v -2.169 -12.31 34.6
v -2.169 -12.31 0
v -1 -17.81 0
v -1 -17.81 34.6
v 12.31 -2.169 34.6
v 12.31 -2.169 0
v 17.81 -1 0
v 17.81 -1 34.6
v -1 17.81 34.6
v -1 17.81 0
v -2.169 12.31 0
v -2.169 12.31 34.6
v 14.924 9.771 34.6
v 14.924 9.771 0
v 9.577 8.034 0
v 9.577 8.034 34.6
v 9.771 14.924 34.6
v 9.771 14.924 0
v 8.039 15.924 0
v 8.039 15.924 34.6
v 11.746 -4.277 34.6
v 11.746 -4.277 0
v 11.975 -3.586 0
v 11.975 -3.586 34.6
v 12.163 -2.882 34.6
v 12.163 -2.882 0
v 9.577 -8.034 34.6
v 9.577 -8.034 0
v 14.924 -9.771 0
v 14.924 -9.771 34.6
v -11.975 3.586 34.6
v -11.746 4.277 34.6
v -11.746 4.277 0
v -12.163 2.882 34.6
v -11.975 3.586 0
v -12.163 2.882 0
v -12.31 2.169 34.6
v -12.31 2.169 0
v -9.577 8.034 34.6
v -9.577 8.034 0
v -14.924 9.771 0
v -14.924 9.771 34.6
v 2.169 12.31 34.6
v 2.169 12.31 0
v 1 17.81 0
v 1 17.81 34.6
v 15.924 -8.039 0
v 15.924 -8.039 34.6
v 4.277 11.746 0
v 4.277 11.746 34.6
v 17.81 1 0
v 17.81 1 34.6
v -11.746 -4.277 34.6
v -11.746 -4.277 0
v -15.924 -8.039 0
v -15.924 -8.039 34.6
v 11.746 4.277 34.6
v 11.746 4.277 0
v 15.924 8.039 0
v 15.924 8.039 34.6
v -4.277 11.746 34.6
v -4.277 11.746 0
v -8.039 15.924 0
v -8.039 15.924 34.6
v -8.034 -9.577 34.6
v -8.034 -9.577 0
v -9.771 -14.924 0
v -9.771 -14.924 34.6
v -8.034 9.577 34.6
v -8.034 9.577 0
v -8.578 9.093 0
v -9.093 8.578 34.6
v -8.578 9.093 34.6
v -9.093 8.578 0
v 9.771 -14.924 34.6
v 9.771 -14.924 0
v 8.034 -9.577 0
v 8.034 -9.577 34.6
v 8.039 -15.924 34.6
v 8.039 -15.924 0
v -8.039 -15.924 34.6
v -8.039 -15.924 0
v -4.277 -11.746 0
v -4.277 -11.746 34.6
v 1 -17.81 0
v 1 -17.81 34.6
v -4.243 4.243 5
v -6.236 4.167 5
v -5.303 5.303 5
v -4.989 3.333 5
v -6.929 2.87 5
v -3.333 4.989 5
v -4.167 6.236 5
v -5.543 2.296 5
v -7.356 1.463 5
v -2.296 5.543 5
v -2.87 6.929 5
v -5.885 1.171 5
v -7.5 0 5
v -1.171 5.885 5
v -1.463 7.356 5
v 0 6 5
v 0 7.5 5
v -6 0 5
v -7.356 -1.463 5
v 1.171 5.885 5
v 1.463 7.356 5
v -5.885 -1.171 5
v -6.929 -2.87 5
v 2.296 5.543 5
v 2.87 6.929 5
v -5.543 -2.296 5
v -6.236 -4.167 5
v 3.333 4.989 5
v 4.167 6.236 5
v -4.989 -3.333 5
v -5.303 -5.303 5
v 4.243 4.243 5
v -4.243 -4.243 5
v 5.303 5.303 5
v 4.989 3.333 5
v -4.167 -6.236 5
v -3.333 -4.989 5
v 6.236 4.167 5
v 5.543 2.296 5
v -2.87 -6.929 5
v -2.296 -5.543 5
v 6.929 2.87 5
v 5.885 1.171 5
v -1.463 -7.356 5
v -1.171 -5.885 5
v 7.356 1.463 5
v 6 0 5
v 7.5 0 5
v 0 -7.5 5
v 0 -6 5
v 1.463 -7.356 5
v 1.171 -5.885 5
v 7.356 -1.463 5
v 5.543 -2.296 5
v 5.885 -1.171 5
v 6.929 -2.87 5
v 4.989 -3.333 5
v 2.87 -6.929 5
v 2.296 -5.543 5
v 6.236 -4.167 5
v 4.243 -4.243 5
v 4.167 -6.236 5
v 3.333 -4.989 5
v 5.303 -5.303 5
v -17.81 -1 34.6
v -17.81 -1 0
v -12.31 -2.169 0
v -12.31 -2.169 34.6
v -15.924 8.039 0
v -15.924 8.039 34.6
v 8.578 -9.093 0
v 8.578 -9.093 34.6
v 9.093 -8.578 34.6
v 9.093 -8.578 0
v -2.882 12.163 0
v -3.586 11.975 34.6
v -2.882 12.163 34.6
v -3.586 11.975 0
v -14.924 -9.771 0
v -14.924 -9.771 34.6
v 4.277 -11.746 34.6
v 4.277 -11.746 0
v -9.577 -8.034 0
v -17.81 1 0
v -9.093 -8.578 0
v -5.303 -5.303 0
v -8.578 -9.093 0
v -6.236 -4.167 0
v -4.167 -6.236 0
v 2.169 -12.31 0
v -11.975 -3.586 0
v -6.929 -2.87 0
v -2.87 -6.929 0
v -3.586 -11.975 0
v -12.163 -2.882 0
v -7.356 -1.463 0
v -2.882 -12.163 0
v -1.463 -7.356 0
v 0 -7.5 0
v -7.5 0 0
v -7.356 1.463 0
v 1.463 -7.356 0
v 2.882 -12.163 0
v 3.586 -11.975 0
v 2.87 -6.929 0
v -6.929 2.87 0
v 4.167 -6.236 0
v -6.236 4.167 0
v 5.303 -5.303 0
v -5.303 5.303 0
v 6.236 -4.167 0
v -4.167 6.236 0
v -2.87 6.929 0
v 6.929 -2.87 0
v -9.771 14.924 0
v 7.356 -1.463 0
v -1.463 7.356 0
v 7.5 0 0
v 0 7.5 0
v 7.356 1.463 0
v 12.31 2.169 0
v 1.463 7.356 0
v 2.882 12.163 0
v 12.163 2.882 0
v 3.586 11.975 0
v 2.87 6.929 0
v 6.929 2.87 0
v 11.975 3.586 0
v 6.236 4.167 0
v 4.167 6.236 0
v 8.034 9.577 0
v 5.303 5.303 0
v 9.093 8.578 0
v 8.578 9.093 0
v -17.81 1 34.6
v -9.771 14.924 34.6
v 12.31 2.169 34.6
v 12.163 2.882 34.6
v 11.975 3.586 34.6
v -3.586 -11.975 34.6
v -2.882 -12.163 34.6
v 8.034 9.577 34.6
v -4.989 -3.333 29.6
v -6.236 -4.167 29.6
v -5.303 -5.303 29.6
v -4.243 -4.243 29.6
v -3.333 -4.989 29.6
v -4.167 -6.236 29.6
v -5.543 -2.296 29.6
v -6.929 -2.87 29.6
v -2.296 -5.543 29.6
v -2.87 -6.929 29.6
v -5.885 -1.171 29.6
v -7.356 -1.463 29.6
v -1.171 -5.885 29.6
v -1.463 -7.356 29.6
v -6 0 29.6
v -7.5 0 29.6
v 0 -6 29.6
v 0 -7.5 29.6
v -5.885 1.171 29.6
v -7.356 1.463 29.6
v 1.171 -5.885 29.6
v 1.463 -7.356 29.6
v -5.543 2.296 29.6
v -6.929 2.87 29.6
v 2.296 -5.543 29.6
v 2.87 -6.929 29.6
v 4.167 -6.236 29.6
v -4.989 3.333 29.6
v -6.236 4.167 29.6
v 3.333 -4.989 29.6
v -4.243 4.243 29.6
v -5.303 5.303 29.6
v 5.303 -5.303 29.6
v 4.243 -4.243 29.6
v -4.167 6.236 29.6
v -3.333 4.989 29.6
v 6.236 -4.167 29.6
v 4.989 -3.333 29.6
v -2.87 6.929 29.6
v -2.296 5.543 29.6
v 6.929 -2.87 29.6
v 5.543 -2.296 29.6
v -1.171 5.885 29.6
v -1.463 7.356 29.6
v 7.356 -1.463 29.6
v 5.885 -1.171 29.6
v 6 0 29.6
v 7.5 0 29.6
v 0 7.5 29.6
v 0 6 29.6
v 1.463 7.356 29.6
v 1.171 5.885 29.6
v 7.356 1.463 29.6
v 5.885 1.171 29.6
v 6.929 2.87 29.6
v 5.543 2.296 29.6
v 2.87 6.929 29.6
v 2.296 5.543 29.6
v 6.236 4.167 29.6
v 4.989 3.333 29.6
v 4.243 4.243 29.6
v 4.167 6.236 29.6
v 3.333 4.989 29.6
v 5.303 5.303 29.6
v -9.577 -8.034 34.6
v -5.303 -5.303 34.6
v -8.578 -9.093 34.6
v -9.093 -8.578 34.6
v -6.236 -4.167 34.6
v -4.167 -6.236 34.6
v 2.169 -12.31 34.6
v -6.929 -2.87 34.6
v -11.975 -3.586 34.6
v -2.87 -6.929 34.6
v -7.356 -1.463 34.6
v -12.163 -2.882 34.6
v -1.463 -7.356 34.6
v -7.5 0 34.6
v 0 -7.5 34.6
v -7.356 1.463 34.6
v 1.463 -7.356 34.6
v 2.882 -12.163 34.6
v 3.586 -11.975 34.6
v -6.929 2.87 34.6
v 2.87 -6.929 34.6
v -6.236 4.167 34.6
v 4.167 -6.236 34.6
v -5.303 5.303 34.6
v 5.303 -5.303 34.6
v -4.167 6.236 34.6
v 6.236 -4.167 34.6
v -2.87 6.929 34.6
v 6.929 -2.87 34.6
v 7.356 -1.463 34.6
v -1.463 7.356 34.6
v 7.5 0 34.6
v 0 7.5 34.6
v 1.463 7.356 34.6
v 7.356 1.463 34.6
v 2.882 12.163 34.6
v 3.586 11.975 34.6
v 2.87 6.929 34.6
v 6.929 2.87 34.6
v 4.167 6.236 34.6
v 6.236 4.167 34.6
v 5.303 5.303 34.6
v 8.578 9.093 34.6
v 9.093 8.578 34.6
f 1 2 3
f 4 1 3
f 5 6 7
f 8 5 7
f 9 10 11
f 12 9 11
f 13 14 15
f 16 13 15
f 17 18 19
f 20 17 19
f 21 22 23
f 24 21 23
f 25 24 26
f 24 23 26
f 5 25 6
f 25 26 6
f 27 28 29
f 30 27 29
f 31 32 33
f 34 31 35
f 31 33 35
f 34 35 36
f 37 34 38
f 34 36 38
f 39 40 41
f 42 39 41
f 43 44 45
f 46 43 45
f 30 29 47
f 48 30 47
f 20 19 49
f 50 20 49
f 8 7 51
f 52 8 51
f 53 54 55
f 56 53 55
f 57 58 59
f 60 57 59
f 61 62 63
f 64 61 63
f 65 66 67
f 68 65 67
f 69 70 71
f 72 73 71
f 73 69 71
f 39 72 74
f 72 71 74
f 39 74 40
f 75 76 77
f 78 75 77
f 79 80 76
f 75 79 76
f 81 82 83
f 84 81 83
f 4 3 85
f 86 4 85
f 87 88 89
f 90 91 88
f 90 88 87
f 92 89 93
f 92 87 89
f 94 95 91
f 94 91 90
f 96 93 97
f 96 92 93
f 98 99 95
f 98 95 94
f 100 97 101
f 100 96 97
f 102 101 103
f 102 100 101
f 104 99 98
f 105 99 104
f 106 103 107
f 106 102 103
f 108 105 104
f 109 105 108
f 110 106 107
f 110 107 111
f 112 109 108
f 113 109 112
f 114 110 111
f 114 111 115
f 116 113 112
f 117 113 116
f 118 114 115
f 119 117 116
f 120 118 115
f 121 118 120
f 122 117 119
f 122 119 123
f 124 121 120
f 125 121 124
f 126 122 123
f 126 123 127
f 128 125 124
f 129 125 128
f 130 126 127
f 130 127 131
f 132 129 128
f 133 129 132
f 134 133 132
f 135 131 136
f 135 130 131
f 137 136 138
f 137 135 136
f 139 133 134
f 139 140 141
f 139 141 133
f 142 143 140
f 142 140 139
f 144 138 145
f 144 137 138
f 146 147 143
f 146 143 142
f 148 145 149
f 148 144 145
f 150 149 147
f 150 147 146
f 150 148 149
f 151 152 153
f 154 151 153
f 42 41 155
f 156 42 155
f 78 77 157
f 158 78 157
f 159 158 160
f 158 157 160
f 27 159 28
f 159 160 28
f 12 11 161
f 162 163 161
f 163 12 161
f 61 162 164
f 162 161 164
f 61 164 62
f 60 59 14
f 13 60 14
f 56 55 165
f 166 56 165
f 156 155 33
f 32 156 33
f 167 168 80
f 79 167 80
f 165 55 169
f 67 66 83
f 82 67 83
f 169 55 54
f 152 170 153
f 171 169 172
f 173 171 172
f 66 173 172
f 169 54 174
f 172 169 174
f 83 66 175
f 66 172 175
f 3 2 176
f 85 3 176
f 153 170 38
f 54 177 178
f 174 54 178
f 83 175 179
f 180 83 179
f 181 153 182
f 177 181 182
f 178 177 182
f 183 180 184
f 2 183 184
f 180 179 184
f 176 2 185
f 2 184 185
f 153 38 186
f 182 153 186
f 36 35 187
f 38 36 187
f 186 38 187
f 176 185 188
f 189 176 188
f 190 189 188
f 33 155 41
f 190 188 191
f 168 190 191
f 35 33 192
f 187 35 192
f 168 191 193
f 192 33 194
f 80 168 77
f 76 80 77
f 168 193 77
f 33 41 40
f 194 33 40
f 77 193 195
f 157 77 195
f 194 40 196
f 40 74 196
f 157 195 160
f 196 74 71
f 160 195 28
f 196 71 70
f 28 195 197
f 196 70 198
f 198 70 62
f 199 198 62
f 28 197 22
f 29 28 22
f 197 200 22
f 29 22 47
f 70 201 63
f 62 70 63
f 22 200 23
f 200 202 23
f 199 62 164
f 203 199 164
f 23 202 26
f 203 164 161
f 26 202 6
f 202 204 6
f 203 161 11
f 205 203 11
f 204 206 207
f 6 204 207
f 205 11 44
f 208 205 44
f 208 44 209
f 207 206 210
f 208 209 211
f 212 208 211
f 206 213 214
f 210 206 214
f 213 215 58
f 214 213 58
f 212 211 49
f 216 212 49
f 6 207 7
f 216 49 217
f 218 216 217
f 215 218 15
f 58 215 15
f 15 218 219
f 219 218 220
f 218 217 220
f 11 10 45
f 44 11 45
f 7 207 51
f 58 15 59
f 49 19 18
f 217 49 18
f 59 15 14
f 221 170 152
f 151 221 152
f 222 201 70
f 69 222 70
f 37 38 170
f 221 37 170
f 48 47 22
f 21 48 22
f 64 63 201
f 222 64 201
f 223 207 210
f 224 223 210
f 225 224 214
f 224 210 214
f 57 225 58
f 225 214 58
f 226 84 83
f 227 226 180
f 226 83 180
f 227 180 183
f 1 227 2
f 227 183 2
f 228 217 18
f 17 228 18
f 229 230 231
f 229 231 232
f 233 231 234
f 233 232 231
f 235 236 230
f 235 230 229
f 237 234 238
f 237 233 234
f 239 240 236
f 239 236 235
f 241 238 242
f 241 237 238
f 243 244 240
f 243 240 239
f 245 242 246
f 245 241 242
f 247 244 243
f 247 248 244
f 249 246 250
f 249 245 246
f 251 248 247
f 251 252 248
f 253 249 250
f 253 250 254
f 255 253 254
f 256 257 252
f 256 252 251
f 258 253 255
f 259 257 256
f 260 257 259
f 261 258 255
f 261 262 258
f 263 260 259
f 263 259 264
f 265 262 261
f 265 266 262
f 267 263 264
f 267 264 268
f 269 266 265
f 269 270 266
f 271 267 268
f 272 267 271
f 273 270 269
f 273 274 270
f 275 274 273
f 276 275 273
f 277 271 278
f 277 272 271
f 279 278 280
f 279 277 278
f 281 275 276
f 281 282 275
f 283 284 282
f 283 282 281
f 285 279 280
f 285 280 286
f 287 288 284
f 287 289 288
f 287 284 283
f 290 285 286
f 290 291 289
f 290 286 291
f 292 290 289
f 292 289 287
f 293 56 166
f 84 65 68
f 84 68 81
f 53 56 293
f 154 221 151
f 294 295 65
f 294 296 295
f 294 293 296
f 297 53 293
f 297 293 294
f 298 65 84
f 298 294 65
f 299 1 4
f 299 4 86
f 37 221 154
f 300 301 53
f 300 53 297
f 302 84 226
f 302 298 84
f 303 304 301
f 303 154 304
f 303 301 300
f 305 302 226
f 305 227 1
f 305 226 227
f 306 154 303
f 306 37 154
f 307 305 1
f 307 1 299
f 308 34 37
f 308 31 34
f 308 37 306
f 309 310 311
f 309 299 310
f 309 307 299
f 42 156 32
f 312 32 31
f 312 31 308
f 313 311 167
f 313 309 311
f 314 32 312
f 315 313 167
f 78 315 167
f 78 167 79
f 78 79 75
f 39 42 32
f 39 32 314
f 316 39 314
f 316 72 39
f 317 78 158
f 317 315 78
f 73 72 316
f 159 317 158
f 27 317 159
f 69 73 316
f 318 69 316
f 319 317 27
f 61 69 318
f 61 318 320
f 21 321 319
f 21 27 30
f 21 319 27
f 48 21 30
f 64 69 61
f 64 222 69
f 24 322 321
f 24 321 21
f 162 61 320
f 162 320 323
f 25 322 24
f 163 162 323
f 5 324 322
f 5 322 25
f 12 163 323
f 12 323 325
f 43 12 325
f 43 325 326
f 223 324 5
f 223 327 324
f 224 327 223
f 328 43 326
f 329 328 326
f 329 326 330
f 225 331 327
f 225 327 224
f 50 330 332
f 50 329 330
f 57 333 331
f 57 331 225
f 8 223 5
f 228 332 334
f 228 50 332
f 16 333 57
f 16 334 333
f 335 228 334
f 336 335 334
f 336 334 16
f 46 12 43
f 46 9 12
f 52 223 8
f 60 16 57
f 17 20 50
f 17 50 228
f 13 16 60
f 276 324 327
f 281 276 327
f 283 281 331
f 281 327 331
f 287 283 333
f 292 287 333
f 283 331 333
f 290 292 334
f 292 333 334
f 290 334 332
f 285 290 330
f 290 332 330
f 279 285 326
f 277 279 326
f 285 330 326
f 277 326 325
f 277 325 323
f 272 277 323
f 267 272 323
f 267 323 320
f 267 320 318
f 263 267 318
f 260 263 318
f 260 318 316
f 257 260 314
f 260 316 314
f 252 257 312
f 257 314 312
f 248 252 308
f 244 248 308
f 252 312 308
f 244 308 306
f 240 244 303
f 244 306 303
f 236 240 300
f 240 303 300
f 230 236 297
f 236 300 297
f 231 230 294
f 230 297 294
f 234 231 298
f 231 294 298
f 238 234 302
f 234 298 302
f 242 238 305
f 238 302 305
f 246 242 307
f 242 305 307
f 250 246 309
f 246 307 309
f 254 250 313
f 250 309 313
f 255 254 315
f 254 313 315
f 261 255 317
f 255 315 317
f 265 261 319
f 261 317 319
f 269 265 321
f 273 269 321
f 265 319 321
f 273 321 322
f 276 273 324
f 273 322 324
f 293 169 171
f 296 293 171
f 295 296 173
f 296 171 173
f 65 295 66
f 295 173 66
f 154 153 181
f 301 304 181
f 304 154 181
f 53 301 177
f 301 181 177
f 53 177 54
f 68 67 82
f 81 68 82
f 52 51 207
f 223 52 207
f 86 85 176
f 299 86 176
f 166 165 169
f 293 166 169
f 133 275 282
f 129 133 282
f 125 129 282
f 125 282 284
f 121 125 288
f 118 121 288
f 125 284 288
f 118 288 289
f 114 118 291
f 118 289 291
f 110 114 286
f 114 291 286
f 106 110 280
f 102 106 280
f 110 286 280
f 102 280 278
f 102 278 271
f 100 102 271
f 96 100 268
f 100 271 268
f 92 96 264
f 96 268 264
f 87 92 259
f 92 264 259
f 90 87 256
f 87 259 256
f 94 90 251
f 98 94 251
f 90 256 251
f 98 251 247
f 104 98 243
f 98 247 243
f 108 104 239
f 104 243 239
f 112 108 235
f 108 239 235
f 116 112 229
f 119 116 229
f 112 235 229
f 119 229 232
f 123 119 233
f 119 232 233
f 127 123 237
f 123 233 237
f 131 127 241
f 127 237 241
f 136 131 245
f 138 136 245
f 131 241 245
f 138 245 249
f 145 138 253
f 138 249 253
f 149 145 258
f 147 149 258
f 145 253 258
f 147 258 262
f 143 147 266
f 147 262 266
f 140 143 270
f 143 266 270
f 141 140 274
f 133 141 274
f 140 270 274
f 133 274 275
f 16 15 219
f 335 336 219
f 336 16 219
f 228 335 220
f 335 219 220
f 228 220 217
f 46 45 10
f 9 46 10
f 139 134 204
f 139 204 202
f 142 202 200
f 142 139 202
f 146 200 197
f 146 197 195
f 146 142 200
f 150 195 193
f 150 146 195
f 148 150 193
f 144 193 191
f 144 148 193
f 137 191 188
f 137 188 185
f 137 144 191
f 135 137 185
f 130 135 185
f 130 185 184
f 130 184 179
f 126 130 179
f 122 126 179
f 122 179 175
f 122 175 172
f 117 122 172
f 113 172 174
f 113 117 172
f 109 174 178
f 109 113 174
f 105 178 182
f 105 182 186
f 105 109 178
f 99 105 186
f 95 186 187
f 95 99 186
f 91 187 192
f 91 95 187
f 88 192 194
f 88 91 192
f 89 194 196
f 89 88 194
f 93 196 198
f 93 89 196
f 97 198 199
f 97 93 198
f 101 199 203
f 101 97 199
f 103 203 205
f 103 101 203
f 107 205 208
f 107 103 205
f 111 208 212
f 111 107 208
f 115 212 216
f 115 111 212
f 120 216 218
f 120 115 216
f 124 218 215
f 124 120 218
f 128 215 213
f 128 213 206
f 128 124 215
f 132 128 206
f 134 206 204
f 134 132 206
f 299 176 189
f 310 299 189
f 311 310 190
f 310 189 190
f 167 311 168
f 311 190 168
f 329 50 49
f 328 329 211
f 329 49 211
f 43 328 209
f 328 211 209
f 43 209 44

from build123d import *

# Parameters (mm, degrees)
ESQUISSE1_R                  = 12.5
BOSS_EXTRU_1_DEPTH           = 34.6
BOSS_EXTRU_2_START           = -34.6
BOSS_EXTRU_2_DEPTH           = 34.6
R_P_TITION_CIRCULAIRE1_COUNT = 12
ESQUISSE5_R                  = 7.5
ENL_V_MAT_EXTRU_2_DEPTH      = 5
ESQUISSE6_R                  = 6
ENL_V_MAT_EXTRU_3_DEPTH      = 24.6
ENL_V_START                  = -5
ESQUISSE7_R                  = 7.5
ENL_V_MAT_EXTRU_4_DEPTH      = 5


with BuildPart() as part:
    # Esquisse1 → Boss.-Extru.1 (new body)
    with BuildSketch(Plane.XY):
        Circle(ESQUISSE1_R)
    extrude(amount=BOSS_EXTRU_1_DEPTH)

    # Esquisse3 → Boss.-Extru.2 (add)
    with BuildSketch(Plane.XY.offset(34.6).offset(BOSS_EXTRU_2_START)):
        with BuildLine():
            Line((-1, 17.810368556), (-2.169061089, 12.310368556))
            ThreePointArc((-2.169061089, 12.310368556), (0, 12.5), (2.169061089, 12.310368556))
            Line((2.169061089, 12.310368556), (1, 17.810368556))
            Line((1, 17.810368556), (-1, 17.810368556))
        make_face()
    boss_extru_2 = extrude(amount=BOSS_EXTRU_2_DEPTH)

    # Répétition circulaire1: Boss.-Extru.2 ×12 about axis
    r_p_tition_circulaire1_axis = Axis((0, 0, 34.6), (0, 0, -1))
    for i in range(1, R_P_TITION_CIRCULAIRE1_COUNT):
        add(boss_extru_2.rotate(r_p_tition_circulaire1_axis, i * 360 / R_P_TITION_CIRCULAIRE1_COUNT))

    # Esquisse5 → Enlèv. mat.-Extru.2 (cut)
    with BuildSketch(Plane.XY.offset(34.6)):
        Circle(ESQUISSE5_R)
    extrude(amount=-ENL_V_MAT_EXTRU_2_DEPTH, mode=Mode.SUBTRACT)

    # Esquisse6 → Enlèv. mat.-Extru.3 (cut)
    with BuildSketch(Plane.XY.offset(29.6)):
        Circle(ESQUISSE6_R)
    extrude(amount=-ENL_V_MAT_EXTRU_3_DEPTH, mode=Mode.SUBTRACT)

    # Esquisse7 → Enlèv. mat.-Extru.4 (cut)
    with BuildSketch(Plane(origin=(0, 0, 0), x_dir=(-1, 0, 0), z_dir=(0, 0, -1)).offset(ENL_V_START)):
        Circle(ESQUISSE7_R)
    extrude(amount=ENL_V_MAT_EXTRU_4_DEPTH, mode=Mode.SUBTRACT)


solid = part.part
